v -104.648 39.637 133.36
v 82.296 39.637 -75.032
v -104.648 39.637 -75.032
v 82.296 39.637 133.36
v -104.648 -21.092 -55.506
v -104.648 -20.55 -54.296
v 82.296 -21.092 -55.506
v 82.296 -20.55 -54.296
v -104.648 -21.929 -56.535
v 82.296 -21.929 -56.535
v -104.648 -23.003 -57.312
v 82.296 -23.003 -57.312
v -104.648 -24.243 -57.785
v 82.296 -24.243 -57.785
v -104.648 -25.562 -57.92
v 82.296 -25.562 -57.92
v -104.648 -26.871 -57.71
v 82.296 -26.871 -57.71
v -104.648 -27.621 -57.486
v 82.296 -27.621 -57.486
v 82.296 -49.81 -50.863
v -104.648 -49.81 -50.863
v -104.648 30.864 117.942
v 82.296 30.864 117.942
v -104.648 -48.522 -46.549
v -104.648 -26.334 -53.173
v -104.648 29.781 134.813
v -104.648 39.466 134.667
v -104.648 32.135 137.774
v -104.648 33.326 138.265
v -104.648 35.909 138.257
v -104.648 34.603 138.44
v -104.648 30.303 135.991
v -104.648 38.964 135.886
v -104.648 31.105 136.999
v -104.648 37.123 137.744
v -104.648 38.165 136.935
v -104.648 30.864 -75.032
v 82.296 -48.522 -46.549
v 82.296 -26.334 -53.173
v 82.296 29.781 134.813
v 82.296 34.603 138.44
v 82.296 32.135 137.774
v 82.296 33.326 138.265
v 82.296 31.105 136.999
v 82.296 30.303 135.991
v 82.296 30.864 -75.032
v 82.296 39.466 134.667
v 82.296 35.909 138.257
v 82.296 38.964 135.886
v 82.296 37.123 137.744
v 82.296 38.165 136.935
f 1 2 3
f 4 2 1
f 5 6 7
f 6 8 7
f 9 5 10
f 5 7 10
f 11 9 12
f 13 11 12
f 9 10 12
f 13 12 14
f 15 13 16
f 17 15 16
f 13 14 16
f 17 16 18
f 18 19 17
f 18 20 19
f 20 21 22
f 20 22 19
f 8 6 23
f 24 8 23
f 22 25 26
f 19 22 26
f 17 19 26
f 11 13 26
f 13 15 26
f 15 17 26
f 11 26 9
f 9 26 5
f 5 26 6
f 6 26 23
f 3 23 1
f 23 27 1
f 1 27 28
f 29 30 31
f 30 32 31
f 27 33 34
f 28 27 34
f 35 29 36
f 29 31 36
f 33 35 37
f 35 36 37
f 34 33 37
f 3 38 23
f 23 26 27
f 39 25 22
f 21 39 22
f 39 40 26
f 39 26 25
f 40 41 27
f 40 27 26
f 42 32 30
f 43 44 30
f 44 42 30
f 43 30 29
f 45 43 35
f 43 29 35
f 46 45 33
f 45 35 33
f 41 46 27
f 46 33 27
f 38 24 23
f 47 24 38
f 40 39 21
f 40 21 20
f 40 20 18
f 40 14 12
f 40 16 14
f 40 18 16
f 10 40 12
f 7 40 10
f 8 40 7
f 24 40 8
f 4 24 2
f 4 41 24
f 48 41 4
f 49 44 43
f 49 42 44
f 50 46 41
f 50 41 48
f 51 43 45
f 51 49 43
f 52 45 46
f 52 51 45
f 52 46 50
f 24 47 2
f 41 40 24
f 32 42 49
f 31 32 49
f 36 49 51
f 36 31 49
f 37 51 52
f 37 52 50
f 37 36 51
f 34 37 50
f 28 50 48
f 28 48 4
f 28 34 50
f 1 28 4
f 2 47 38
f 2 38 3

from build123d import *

# Parameters (mm, degrees)
F1_DEPTH      = 82.296
F1_DEPTH_BACK = 104.648
F2_R          = 5.08
F3_T1_DEPTH   = 205.8694200864
F4_R          = 5.08


# Not quite as in the source:
# - a fillet or chamfer that OpenCascade refuses, or shapes differently, is made with other operations: its cross-section is extruded or revolved along the edge and cut away or added


with BuildPart() as f1:
    # F0 (on Right) → F1 (new body, two sides)
    with BuildSketch(Plane.YZ) as f1_sk:
        Polygon((30.8638699353, 138.4397298098), (-26.3338502244, -53.1726228883), (-48.5219567113, -46.5493071791), (-49.8095880545, -50.8628719574), (-27.6214815676, -57.4861876667), (-22.003299054, -59.1632571598), (30.8638699353, 117.9417498623), (30.8638699353, -75.0317946076), (39.6366678178, -75.0317946076), (39.6366678178, 138.4397298098), align=None)
    extrude(amount=F1_DEPTH)
    extrude(f1_sk.sketch, amount=-F1_DEPTH_BACK)

    # F2
    f2_edges = [f1.edges().sort_by_distance(p)[0] for p in [
        (-11.176, 39.636668, 138.43973),
    ]]
    fillet(f2_edges, radius=F2_R)

    # F3: fillet of radius 5.08 on 1 edges, made by hand

    # F3_s2 → F3_t1 (cut)
    with BuildSketch(Plane.YZ.offset(-114.1107100432)):
        with BuildLine():
            ThreePointArc((34.6489539526, 138.4397298098), (31.6137560641, 137.4332999611), (29.7812013849, 134.8127903523))
            Line((29.7812013849, 134.8127903523), (30.8638699353, 138.4397298098))
            Line((30.8638699353, 138.4397298098), (34.6489539526, 138.4397298098))
        make_face()
    extrude(amount=F3_T1_DEPTH, mode=Mode.SUBTRACT)

    # F4
    f4_edges = [f1.edges().sort_by_distance(p)[0] for p in [
        (-11.176, -22.003299, -59.163257),
    ]]
    fillet(f4_edges, radius=F4_R)


solid = f1.part
